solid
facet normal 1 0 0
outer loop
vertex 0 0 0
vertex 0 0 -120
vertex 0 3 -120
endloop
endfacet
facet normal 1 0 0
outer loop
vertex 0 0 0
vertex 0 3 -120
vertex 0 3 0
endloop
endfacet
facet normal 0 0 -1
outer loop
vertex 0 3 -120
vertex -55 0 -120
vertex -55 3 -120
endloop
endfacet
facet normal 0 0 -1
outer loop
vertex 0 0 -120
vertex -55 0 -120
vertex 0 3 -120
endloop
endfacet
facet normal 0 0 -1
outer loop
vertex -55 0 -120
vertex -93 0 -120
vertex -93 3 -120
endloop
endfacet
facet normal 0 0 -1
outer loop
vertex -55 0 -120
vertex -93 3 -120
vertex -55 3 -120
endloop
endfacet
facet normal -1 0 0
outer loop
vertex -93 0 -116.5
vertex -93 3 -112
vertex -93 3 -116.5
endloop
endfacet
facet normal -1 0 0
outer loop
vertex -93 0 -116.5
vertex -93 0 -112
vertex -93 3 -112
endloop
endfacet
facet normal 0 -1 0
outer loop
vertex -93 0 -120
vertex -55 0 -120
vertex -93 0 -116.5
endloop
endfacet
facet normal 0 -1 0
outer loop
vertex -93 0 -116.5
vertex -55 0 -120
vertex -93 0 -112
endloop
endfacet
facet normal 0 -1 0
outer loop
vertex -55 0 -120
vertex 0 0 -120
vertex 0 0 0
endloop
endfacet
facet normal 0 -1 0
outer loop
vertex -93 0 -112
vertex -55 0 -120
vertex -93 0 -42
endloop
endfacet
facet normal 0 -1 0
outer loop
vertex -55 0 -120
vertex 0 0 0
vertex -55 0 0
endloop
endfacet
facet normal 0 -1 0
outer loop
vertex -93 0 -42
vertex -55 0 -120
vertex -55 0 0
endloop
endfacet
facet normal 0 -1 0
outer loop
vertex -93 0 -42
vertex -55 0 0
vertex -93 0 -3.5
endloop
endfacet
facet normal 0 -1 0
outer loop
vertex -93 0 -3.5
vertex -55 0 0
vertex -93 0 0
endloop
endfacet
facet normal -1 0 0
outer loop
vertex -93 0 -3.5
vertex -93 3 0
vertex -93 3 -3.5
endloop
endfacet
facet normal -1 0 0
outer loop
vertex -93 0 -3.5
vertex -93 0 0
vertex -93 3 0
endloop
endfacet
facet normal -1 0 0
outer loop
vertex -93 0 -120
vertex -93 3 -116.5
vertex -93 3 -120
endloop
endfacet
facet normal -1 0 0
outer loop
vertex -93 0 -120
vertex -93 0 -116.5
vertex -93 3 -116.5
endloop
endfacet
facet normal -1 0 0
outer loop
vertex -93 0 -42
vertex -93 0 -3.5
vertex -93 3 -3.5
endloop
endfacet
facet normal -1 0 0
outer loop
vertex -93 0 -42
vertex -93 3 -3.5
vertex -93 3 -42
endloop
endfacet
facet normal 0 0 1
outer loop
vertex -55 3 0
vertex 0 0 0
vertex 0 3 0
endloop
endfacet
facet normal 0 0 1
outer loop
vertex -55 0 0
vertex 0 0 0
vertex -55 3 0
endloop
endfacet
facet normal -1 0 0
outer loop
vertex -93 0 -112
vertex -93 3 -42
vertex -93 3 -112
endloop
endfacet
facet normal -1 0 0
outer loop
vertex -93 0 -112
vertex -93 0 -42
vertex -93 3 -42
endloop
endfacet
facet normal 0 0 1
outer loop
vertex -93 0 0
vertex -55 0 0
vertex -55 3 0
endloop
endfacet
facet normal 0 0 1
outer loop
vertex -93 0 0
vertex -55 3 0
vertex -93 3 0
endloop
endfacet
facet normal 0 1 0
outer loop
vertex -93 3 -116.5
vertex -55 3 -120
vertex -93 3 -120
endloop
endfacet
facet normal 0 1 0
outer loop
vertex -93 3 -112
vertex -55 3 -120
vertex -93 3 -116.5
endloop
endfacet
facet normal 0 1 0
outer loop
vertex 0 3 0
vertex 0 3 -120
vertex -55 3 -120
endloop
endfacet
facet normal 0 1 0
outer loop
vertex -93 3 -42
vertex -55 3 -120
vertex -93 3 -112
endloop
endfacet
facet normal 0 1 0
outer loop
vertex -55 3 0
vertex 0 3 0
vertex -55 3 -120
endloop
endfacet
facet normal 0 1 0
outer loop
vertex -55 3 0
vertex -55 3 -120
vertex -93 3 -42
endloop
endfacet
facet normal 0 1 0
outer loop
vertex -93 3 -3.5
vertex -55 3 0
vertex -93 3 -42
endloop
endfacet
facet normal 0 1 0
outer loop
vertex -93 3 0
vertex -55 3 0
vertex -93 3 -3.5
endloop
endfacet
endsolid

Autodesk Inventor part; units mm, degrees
ref_plane "YZ Plane" through (0, 0, 0) normal (1, 0, 0) x (0, 1, 0)
ref_plane "XZ Plane" through (0, 0, 0) normal (0, 1, 0) x (-1, 0, 0)
ref_plane "XY Plane" through (0, 0, 0) normal (0, 0, 1) x (1, 0, 0)
sketch "Sketch1" plane through (0, 0, 0) normal (0, 1, 0) x (-1, 0, 0)
  line L0 (0, 0) -> (93, 0)
  line L1 (93, 0) -> (93, -120)
  line L2 (93, -120) -> (0, -120)
  line L3 (0, -120) -> (0, 0)
  line L4 (93, -120) -> (55, -120)
  line L5 (93, -116.5) -> (93, -120)
  line L6 (93, 0) -> (55, 0)
  line L7 (93, -3.5) -> (93, 0)
  line L8 (93, -42) -> (93, -112)
  point P0 (46.5, 0)
  dimension "d0" = 120
  dimension "d1" = 93
extrude "Extrusion1" add sketch "Sketch1" along normal blind 3
properties part number "CapRS3" material "Steel"
